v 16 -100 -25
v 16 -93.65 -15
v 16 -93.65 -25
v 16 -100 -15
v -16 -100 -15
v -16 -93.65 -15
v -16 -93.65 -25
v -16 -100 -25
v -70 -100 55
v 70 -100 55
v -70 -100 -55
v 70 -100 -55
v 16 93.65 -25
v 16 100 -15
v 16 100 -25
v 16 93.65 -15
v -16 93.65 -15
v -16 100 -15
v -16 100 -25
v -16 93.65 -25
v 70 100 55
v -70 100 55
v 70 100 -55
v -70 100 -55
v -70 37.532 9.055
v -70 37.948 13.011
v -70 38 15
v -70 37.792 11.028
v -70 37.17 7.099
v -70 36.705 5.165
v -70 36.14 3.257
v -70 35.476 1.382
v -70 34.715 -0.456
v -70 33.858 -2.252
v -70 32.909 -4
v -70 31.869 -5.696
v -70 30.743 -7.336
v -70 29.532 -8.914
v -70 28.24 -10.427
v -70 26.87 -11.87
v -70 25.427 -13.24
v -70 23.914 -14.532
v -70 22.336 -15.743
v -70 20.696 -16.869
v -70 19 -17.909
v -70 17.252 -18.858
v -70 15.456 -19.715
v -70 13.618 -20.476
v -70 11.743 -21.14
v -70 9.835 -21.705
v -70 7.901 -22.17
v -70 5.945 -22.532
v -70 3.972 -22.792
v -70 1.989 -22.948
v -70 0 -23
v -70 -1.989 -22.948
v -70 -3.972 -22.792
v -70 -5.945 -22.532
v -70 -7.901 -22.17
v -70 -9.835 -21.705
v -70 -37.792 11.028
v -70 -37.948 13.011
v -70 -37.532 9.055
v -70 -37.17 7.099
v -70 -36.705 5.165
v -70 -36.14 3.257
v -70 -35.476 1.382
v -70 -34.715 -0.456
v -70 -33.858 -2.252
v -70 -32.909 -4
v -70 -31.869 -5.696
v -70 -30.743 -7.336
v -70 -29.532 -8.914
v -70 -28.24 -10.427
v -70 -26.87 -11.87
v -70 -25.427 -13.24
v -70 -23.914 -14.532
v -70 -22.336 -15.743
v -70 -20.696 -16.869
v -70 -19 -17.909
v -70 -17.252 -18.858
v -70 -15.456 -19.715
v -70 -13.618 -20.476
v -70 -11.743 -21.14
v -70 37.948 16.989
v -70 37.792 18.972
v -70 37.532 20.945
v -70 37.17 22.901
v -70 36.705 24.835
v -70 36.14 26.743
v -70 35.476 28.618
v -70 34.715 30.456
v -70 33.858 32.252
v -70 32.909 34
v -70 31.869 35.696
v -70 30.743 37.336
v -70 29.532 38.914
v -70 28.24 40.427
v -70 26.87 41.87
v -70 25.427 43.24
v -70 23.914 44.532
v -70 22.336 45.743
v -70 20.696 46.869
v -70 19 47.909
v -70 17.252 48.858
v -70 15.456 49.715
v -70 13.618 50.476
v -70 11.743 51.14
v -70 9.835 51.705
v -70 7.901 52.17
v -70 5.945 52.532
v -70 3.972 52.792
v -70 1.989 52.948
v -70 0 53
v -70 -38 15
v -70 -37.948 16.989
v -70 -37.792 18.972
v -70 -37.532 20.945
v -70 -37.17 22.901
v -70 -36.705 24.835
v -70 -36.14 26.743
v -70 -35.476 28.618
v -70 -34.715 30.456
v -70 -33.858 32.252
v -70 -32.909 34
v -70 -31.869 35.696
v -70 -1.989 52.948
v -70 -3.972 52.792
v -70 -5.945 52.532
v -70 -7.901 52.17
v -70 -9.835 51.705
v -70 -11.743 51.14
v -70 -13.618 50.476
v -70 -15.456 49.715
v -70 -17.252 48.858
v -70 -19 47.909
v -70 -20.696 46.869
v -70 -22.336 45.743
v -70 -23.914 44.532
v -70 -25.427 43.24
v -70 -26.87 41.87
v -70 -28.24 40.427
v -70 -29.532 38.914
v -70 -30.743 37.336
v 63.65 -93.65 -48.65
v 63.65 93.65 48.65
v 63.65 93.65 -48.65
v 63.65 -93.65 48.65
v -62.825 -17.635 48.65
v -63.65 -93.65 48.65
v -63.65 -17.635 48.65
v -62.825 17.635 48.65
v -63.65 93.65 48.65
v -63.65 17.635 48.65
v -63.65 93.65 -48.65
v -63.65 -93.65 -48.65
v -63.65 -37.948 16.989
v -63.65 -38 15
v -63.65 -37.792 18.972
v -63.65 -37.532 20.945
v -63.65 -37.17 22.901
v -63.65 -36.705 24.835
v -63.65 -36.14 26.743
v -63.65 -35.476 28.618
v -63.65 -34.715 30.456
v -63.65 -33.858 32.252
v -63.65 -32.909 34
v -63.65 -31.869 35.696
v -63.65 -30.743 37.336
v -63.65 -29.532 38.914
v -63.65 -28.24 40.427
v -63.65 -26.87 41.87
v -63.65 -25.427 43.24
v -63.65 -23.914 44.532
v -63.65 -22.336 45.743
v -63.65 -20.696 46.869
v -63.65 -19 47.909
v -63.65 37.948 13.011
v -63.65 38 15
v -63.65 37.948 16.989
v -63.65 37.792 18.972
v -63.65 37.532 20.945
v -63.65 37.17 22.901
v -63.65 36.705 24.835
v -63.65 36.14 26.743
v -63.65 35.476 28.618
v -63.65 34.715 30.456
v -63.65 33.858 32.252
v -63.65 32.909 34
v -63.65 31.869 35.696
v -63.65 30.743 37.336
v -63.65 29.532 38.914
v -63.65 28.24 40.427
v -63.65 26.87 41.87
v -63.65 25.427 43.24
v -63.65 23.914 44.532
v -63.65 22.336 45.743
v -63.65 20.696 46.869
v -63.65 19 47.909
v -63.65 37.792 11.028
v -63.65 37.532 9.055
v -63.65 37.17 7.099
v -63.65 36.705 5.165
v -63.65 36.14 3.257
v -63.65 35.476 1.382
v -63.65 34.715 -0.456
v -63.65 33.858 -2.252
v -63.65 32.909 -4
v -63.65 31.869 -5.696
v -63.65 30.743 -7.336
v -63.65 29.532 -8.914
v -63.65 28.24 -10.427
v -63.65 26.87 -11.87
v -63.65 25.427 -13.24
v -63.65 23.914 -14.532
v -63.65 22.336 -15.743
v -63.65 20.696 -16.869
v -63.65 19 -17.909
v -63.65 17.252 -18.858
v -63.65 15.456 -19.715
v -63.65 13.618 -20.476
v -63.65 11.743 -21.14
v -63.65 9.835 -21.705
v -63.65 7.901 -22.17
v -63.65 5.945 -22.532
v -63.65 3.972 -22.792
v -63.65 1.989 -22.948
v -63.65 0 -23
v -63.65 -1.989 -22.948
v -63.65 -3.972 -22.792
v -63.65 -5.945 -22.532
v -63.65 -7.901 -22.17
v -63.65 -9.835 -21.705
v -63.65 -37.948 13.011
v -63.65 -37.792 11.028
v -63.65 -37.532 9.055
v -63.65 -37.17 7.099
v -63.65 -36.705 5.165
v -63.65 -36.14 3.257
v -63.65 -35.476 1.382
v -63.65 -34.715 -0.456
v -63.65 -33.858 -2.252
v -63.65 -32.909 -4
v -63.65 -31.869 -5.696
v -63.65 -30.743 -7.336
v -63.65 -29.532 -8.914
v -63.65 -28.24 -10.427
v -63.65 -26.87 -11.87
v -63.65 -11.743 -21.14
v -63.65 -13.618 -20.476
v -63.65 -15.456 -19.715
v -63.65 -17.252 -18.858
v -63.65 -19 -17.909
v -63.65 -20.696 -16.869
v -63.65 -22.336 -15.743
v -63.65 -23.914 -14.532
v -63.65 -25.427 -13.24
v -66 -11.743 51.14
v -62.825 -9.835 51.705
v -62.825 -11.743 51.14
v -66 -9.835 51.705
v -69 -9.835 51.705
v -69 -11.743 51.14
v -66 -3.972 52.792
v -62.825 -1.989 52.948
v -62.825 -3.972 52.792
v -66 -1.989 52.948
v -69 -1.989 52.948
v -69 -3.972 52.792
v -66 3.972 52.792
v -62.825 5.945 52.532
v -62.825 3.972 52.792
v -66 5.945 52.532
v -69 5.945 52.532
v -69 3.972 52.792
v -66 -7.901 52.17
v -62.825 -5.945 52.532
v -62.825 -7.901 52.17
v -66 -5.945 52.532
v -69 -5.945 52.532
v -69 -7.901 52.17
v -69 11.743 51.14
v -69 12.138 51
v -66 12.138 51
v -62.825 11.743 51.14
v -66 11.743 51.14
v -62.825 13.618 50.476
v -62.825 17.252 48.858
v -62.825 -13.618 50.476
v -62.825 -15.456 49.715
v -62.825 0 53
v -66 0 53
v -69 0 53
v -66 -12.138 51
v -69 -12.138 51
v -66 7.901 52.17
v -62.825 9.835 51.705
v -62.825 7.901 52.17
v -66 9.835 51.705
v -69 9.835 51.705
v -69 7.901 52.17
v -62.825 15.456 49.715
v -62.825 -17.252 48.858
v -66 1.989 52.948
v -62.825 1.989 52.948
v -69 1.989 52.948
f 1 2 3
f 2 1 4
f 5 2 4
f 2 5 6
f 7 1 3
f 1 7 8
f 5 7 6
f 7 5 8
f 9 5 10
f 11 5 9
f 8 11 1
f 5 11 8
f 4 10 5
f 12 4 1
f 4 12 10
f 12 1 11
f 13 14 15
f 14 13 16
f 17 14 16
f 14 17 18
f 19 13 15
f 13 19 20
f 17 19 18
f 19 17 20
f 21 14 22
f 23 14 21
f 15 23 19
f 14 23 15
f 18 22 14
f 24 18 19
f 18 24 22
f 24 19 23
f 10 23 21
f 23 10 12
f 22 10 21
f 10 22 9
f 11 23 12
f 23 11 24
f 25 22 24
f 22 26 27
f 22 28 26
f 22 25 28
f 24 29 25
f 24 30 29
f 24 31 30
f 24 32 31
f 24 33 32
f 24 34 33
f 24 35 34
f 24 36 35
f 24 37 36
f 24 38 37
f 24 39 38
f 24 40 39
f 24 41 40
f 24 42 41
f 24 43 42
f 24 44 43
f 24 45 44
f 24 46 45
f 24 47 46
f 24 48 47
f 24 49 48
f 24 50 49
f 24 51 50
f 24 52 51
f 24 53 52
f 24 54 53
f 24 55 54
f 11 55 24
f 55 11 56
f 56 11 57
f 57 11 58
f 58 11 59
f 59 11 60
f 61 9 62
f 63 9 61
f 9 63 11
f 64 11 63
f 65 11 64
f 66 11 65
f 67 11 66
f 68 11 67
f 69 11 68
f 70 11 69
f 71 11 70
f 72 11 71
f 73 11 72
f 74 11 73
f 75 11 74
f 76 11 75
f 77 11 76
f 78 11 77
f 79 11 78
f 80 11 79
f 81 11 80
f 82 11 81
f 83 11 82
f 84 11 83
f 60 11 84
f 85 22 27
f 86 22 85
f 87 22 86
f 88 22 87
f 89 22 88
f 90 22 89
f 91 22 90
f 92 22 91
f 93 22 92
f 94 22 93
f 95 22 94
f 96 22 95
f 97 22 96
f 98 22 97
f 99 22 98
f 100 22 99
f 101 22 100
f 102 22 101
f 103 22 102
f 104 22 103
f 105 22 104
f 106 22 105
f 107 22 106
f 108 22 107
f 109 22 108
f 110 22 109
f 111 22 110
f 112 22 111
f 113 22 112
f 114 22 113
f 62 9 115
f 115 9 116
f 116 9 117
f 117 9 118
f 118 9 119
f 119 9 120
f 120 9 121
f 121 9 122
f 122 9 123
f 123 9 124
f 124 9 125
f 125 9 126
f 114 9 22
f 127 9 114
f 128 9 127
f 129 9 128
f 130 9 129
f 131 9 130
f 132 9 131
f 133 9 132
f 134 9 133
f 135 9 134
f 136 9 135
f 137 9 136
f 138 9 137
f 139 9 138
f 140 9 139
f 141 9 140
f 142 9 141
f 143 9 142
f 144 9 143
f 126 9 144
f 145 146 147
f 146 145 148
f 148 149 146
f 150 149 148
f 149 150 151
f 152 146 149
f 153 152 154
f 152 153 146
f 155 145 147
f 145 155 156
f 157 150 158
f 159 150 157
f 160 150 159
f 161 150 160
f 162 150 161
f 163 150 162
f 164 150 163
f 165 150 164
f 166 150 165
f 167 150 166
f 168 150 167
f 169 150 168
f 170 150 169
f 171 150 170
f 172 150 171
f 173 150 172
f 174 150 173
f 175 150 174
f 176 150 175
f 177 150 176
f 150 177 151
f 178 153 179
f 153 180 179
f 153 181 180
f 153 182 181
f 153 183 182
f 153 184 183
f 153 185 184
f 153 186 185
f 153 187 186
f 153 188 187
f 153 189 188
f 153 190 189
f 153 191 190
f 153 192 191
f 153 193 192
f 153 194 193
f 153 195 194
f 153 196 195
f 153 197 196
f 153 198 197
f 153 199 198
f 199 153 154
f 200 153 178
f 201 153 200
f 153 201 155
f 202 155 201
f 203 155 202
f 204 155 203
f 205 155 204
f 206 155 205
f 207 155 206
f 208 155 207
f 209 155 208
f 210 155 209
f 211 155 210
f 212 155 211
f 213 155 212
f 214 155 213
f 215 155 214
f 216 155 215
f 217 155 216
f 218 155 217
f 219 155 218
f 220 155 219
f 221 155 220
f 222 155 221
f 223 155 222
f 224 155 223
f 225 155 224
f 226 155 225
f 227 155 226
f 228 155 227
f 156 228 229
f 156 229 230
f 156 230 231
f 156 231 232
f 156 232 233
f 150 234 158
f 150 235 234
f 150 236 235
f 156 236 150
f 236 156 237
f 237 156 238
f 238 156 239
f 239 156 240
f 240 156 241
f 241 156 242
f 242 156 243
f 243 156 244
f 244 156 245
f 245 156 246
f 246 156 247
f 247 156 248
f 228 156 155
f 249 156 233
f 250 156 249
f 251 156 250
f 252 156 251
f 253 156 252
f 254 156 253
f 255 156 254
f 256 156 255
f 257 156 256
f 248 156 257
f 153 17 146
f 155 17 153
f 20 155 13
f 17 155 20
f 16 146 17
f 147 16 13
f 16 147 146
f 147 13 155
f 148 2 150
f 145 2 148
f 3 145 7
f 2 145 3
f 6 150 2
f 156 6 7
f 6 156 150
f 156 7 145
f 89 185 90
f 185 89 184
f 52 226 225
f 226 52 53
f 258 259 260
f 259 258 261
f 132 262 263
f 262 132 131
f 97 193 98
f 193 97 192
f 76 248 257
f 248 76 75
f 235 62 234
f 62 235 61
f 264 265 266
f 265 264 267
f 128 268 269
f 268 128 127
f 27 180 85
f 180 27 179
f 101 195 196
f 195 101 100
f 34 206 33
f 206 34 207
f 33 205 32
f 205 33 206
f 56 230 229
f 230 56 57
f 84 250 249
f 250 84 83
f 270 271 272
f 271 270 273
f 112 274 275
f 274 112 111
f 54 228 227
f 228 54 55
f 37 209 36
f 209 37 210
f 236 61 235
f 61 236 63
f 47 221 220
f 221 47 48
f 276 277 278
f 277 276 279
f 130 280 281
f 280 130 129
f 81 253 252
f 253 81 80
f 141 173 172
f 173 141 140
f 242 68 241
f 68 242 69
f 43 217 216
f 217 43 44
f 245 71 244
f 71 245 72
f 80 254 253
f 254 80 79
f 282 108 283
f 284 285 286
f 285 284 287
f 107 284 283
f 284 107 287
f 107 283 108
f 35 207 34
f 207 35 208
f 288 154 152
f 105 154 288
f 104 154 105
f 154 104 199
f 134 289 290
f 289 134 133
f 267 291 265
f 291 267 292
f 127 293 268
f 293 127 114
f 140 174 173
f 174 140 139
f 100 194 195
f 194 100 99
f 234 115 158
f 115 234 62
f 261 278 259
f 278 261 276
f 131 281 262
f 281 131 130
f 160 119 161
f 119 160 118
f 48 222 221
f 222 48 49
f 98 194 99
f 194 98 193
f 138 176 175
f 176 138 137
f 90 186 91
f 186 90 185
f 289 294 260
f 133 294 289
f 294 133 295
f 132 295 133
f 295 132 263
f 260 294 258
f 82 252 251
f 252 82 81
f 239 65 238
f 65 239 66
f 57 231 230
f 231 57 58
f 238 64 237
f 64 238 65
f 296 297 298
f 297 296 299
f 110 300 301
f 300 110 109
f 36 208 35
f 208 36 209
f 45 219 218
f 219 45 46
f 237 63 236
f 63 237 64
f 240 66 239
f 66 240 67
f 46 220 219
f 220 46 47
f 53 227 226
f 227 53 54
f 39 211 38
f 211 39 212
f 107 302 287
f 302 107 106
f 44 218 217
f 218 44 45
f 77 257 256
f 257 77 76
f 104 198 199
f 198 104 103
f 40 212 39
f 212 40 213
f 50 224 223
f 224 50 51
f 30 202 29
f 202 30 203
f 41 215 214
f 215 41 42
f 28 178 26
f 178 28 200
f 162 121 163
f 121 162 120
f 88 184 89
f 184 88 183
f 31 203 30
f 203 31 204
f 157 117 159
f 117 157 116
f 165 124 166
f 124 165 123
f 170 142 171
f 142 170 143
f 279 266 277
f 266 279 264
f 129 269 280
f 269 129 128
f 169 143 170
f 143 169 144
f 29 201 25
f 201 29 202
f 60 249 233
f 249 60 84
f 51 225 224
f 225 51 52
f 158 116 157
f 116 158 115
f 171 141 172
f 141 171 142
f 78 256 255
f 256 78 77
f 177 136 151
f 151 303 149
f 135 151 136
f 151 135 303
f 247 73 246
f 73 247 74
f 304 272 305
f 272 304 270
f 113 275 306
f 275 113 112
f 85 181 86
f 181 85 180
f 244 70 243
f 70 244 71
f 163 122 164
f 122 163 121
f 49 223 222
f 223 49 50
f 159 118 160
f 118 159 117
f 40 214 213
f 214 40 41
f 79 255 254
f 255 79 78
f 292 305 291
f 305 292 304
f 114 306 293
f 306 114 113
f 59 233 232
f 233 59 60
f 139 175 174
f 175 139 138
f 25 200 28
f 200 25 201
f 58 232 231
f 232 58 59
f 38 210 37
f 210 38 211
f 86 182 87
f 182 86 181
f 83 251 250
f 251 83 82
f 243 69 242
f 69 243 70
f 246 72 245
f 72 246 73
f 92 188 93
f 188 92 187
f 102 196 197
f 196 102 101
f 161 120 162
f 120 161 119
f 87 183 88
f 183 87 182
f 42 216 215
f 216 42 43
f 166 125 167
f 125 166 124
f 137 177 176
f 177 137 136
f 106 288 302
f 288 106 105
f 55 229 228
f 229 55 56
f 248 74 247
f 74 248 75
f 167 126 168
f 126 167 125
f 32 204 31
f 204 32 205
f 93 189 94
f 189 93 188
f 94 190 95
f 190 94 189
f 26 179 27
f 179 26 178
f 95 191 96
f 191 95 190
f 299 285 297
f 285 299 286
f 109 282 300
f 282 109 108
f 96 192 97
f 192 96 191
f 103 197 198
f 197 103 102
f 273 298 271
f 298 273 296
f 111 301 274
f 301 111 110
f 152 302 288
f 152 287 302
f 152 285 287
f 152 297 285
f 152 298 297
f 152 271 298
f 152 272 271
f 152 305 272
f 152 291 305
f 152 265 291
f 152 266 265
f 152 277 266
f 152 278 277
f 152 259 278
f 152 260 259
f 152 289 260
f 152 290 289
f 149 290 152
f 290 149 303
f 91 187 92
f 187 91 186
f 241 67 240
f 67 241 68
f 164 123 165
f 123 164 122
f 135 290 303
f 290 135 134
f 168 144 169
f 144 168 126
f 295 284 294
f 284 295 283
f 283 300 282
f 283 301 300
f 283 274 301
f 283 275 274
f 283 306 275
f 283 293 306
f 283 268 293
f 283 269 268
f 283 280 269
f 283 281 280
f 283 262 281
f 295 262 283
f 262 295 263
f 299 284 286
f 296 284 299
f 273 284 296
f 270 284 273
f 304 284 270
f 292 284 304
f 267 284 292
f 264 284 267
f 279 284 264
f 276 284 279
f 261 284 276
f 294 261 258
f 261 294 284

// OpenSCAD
// ====================================================================================
// REVOLUTIONARY TECHNOLOGY COMPANY & UNIVERSITY OF WASHINGTON DEPARTMENT OF PHYSICS
// Subsystem: copo_hv_breaker_vault.scad (800V Master Safety Disconnect Enclosure)
// Core Standard: Explosion-Resistant Hardened Vault / Active Shroud Blower Port
// Center Origin (0,0,0) = Geometric Centerpoint of the Primary High-Current Busbar Post
// ====================================================================================

$fn = 120; // High-precision CNC milling and waterjet routing resolution

// --- Physical Vault Constraints & Constants (mm) ---
inch_to_mm         = 25.4;
vault_length       = 200.00;           // Fits tightly along lower left frame rail channel
vault_width        = 140.00;           // Compact packaging envelope minimizing unsprung mass
vault_height       = 110.00;           // Spatial box clearance threshold
wall_thickness_ti  = 6.35;             // 1/4" Thick Titanium Grade 5 safety containment shield

// Component Port Interface Diameters (mm)
busbar_entry_w     = 32.00;            // Sized for 30mm x 5mm rigid copper traction bars
blower_intake_d    = 76.00;            // Clears the low-noise 80mm active cooling blower throat

module heavy_high_voltage_breaker_vault() {
    echo("MILLING EXPLOSION-RESISTANT HIGH-VOLTAGE SAFETY DISCONNECT VAULT SHIELD");
    color("DimGrey") {
        difference() {
            // Main solid high-voltage contactor containment vault box
            cube([vault_width, vault_length, vault_height], center=true);
            
            // Internal component cavity leaving ample volume for pyro-fuses and relays
            cube([vault_width - (2*wall_thickness_ti), vault_length - (2*wall_thickness_ti), vault_height - (2*wall_thickness_ti)], center=true);
            
            // 1. INBOUND AND OUTBOUND RIGID COPPER BUSBAR THROUGH-SLOTS
            for (y_offset = [-90, 90]) {
                translate([0, y_offset, -20])
                    cube([busbar_entry_w, 20, 10], center=true);
            }
            
            // 2. CONCENTRIC THERMAL BLOWER ACTIVE INTENSIVE COOLING EXHAUST PORT
            translate([-vault_width/2 + 2, 0, 15])
                rotate([0, 90, 0])
                    cylinder(d=blower_intake_d, h=wall_thickness_ti + 4, center=true);
        }
    }
}

module acdelco_seal_perimeter_groove() {
    // 3mm deep perimeter routing track carved into the vault mating flange.
    // Holds the form-molded natural tree-rubber gasket to guarantee IP69K weatherproofing.
    color("DarkSlateGrey") {
        translate([0, 0, vault_height/2 - 2])
            difference() {
                cube([vault_width - 2, vault_length - 2, 4], center=true);
                cube([vault_width - 8, vault_length - 8, 6], center=true);
            }
    }
}

// --- Composite Structural Breaker Vault Instantiation ---
union() {
    heavy_high_voltage_breaker_vault();
    acdelco_seal_perimeter_groove();
}
